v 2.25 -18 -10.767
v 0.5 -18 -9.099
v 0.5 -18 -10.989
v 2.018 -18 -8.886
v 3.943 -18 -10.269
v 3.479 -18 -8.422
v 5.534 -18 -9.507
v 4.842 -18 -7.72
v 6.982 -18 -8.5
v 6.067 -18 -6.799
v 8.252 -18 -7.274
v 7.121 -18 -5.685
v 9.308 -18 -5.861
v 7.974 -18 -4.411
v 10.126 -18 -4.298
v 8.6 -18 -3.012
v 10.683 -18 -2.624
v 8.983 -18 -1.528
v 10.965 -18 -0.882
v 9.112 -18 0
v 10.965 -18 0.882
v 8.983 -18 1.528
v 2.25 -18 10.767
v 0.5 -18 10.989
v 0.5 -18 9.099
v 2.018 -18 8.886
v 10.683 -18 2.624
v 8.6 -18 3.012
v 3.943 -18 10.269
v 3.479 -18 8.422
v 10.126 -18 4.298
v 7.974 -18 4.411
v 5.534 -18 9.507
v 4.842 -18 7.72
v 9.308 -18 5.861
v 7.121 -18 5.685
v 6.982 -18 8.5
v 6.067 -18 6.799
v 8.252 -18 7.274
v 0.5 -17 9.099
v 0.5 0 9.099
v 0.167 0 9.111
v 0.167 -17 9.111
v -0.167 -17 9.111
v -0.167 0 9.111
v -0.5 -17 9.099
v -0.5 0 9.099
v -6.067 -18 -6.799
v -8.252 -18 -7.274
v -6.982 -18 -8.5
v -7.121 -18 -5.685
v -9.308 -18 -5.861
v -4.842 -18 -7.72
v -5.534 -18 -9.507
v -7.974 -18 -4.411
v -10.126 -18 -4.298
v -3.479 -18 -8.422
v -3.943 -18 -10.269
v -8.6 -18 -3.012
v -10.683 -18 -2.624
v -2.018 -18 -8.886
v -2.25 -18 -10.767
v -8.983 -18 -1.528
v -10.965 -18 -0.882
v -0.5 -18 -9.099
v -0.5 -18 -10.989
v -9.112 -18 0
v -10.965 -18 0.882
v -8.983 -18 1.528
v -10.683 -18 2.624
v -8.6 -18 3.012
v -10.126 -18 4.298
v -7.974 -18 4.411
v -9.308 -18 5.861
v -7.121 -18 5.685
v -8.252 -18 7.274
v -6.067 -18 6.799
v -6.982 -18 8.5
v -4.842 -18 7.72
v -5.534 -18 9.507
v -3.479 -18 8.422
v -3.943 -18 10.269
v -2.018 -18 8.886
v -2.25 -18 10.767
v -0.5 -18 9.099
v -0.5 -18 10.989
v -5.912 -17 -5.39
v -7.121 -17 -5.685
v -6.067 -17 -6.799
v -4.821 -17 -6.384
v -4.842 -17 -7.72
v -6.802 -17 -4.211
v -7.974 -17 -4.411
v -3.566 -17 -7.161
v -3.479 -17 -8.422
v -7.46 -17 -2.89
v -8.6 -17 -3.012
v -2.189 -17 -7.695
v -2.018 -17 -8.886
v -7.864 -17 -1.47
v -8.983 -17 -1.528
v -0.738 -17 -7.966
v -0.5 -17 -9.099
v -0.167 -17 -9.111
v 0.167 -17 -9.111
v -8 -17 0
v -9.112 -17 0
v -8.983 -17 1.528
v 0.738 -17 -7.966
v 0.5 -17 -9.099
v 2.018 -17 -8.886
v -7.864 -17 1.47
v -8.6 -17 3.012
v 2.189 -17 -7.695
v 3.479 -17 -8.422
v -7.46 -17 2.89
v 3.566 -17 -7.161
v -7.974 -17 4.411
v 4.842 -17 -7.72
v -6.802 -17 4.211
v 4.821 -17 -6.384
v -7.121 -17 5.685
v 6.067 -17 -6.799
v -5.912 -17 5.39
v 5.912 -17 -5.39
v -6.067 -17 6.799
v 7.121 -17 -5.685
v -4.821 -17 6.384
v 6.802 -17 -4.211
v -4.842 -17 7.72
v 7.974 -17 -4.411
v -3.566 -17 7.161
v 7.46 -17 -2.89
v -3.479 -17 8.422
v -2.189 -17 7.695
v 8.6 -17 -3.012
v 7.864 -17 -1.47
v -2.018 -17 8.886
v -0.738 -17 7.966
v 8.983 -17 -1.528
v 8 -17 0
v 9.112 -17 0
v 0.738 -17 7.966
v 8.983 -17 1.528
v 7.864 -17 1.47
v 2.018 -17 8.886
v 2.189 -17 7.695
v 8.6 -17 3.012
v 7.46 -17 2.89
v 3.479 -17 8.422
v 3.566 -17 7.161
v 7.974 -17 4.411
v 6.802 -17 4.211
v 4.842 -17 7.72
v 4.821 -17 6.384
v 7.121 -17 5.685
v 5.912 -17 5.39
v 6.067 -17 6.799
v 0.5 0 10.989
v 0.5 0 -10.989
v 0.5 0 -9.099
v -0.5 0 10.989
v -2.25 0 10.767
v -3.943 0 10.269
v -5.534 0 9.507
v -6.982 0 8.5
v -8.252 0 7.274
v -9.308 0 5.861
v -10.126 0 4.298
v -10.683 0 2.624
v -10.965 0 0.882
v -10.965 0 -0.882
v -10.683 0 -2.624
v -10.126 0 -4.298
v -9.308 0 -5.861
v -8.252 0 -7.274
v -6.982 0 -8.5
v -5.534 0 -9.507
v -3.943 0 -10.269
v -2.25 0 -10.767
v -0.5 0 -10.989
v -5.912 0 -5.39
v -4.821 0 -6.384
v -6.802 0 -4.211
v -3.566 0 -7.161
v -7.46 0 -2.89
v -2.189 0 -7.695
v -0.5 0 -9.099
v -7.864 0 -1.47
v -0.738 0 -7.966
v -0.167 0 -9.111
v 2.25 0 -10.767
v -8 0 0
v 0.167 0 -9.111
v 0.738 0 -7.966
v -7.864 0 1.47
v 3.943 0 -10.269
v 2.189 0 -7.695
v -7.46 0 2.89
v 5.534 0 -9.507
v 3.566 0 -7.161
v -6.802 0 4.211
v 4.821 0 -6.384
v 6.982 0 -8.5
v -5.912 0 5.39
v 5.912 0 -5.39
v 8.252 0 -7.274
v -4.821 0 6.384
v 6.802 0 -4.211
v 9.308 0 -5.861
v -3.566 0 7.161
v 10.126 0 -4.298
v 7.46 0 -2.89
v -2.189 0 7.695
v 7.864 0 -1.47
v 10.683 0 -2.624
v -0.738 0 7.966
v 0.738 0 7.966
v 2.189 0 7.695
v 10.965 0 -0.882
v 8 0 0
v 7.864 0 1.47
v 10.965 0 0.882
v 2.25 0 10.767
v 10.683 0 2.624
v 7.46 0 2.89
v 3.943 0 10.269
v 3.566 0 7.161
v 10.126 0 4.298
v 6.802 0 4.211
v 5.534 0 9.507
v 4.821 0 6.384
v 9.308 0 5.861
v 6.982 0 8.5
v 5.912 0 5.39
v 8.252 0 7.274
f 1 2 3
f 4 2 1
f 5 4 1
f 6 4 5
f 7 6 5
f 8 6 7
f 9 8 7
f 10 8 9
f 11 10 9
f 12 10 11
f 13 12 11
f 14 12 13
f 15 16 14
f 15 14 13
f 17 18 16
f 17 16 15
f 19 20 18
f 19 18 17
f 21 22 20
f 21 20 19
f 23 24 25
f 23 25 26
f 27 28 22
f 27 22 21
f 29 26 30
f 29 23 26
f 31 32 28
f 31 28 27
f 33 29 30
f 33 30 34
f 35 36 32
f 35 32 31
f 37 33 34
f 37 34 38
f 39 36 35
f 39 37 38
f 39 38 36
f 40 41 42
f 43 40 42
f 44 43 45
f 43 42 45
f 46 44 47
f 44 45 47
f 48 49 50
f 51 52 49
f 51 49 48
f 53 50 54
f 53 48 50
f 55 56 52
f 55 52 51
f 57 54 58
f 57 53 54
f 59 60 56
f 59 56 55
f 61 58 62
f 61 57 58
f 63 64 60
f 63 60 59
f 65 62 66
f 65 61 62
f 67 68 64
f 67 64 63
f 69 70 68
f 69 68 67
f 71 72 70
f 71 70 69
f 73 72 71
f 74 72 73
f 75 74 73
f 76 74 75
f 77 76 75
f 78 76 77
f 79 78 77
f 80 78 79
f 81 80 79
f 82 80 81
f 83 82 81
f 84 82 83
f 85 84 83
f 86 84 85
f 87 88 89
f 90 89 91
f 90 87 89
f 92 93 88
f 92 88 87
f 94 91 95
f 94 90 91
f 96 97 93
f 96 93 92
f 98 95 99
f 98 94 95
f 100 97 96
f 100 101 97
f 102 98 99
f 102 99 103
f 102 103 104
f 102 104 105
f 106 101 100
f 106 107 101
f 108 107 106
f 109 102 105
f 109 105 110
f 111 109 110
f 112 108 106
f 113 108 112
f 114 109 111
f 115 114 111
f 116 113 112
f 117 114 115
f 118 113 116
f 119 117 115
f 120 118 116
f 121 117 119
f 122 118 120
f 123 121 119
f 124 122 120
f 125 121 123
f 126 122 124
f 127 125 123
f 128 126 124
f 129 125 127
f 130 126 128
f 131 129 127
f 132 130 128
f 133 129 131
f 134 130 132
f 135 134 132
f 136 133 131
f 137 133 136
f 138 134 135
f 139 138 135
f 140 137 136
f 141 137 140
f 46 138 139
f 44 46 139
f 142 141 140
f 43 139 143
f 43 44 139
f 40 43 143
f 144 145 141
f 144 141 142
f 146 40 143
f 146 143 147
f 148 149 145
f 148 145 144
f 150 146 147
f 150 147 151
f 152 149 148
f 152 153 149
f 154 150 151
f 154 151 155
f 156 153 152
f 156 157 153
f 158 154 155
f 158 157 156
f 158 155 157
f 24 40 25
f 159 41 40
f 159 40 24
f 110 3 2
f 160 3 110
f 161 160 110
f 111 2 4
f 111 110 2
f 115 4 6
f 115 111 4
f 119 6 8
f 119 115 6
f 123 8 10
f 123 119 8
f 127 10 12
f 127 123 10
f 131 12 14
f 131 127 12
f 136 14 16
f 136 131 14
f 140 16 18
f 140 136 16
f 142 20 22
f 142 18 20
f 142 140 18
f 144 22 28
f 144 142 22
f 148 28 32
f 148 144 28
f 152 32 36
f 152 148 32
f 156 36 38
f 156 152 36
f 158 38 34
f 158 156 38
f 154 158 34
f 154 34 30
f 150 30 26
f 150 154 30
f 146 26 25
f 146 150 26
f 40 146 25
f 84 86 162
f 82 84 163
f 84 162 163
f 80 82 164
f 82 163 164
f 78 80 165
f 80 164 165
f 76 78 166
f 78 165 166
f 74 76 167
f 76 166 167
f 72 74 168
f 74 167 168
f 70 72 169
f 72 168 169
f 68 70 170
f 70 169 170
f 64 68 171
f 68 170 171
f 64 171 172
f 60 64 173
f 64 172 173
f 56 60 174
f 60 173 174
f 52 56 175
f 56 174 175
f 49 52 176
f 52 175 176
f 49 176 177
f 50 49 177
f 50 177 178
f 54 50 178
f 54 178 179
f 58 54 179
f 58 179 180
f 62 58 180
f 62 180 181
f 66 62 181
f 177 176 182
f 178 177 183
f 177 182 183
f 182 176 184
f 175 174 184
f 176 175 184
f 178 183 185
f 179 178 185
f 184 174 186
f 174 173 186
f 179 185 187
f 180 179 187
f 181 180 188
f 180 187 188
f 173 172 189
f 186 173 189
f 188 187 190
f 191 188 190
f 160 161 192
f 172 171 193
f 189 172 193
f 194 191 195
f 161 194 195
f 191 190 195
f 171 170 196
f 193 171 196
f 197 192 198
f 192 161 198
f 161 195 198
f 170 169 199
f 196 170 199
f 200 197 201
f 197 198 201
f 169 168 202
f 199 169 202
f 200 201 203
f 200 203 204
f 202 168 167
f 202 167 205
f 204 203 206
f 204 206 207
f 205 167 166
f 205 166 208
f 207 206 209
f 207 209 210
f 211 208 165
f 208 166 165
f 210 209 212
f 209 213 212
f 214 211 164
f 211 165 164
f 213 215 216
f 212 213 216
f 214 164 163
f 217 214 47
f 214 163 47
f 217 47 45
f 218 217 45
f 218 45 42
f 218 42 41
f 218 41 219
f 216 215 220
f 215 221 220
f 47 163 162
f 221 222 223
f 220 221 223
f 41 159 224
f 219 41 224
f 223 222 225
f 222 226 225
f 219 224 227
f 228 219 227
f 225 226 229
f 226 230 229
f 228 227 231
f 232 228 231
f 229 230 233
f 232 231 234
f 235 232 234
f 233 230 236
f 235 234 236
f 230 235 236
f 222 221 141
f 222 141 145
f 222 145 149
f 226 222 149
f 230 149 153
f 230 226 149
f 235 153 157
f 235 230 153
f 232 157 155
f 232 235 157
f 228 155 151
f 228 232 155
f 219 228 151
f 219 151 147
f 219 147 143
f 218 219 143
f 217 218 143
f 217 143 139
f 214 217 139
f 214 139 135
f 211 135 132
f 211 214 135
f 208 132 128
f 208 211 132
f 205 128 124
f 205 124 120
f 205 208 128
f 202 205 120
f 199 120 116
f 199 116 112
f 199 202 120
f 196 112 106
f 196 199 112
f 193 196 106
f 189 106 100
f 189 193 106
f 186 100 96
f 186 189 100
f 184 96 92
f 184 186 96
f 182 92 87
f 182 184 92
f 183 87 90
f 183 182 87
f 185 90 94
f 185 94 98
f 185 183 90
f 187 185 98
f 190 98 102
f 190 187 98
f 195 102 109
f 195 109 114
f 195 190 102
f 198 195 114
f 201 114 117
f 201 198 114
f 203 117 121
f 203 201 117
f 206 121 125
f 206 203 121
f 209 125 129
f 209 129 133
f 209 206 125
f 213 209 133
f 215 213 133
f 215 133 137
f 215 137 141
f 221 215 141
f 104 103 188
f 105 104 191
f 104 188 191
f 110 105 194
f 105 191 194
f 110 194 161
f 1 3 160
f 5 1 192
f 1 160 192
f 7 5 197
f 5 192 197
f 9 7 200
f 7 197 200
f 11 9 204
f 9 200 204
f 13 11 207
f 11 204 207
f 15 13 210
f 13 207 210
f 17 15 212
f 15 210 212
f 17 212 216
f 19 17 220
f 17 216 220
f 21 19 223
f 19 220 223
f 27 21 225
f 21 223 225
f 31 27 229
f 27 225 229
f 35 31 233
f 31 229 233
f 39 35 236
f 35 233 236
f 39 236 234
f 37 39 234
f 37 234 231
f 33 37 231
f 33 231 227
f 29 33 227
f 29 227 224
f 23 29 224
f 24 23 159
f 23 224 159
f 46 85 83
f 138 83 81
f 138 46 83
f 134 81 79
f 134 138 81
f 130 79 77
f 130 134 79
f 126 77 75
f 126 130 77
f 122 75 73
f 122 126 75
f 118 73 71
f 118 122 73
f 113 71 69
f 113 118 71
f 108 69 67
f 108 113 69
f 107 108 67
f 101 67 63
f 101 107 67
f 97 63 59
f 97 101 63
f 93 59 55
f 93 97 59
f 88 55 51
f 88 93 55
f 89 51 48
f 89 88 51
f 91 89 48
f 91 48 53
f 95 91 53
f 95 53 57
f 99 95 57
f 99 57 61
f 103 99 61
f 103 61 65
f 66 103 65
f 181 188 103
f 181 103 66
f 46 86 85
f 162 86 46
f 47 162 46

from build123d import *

# Parameters (mm, degrees)
F0_R     = 11
F0_R_2   = 9.1123830153
F1_DEPTH = 18
F3_DEPTH = 25
F0_R_3   = 8
F4_DEPTH = 17


with BuildPart() as f1:
    # F0 (on Front) → F1 (new body)
    with BuildSketch(Plane.XZ):
        Circle(F0_R)
        Circle(F0_R_2, mode=Mode.SUBTRACT)
    extrude(amount=F1_DEPTH)

    # F2 (on Front) → F3 (cut)
    with BuildSketch(Plane.XZ):
        Polygon((-0.5, 11.3087910658), (-0.5, 1.3087910658), (0.5, 1.3087910658), (0.5, 11.2789400049), align=None)
        Polygon((0.5, -1.3087910658), (-0.5, -1.3087910658), (-0.5, -11.3087910658), (0.5, -11.2789400049), align=None)
    extrude(amount=F3_DEPTH, mode=Mode.SUBTRACT)

    # F0 (on Front) → F4 (join)
    with BuildSketch(Plane.XZ):
        Circle(F0_R_2)
        Circle(F0_R_3, mode=Mode.SUBTRACT)
    extrude(amount=F4_DEPTH)


solid = f1.part
